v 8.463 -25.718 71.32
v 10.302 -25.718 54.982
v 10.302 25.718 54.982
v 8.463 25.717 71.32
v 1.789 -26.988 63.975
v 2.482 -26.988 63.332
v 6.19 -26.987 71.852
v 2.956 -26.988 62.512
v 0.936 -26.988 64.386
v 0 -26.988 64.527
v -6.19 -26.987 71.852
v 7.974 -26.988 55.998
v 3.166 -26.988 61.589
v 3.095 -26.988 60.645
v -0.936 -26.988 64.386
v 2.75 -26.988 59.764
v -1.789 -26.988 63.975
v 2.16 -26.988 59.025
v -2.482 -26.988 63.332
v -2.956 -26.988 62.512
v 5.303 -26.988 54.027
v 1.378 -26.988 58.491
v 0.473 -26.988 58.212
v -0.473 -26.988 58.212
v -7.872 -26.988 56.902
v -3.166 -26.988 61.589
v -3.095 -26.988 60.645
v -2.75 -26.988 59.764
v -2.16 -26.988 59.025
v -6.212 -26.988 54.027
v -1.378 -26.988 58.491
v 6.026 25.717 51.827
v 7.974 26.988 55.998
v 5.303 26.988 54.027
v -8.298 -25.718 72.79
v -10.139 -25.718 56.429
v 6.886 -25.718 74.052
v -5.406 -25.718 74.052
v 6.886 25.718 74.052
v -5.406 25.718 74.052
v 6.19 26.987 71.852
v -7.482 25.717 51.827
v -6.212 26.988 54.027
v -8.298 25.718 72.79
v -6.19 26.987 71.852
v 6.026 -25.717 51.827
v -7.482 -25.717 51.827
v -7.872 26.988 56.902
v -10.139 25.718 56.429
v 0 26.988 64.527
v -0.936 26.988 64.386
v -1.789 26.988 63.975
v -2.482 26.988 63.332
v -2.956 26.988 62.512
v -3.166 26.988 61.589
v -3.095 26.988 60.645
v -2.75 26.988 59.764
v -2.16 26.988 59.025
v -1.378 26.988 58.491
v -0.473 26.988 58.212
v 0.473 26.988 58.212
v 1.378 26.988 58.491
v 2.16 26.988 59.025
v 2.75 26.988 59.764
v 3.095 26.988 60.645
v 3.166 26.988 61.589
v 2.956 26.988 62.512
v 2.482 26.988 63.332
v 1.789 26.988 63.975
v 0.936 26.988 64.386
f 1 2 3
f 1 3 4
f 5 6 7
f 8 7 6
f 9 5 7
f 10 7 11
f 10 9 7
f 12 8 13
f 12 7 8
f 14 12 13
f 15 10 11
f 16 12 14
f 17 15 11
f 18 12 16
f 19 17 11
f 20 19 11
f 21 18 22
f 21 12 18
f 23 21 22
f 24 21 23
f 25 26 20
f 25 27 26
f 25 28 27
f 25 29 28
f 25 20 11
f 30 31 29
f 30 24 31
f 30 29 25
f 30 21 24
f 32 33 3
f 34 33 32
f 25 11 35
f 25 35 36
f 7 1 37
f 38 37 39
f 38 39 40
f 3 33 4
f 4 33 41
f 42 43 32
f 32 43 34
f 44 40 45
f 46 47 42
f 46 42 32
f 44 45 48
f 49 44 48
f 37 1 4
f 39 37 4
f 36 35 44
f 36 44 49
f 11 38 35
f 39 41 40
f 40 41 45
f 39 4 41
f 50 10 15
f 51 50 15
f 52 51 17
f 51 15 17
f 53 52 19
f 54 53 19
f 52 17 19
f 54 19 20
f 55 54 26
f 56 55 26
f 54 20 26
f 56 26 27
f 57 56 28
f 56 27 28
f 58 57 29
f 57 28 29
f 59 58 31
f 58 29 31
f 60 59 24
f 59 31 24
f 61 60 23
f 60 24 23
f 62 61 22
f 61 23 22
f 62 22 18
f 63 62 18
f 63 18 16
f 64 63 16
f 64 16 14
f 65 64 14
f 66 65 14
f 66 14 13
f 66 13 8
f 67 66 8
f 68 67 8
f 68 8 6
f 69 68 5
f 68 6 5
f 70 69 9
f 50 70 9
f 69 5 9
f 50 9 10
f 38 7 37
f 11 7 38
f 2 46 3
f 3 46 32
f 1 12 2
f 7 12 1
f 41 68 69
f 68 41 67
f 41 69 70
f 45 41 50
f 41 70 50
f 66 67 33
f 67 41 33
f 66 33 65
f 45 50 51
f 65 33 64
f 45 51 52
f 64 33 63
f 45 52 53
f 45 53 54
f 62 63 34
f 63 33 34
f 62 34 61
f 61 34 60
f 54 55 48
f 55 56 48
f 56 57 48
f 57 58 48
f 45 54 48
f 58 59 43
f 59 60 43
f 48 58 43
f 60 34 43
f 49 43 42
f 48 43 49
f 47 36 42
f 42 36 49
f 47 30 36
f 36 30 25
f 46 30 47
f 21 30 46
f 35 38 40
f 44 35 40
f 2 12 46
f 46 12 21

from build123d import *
from OCP.BRepFilletAPI import BRepFilletAPI_MakeChamfer

# Parameters (mm, degrees)
SKETCH1_R           = 3.175
BOSS_EXTRUDE1_DEPTH = 53.975
CHAMFER1_SIZE       = 3.175
CHAMFER1_SIZE2      = 4.631063529
CHAMFER2_SIZE       = 1.27
CHAMFER2_SIZE2      = 2.749716278
CHAMFER2_SIZE2_2    = 2.199704526


# Read off the part's stored shape, not the designer's step: Imported1
with BuildPart() as part:
    # Sketch1 → Boss-Extrude1 (new body)
    with BuildSketch(Plane(origin=(0, -26.9875, 0), x_dir=(-1, 0, 0), z_dir=(0, -1, 0))):
        Polygon((-8.155551794, -74.05198332), (8.155551794, -74.05198332), (10.657362253, -51.82698332), (-10.657362253, -51.82698332), align=None)
        with Locations(Location((0, -61.35198332, 0), (0, 0, 270))):
            Circle(SKETCH1_R, mode=Mode.SUBTRACT)
    extrude(amount=-BOSS_EXTRUDE1_DEPTH)

    # Chamfer1: one chamfer whose edges measure the first distance from different faces: ONE call of the kernel's chamfer builder (chamfer() names one face for all edges)
    chamfer1_edges_1 = [part.edges().sort_by_distance(p)[0] for p in [
        (-10.657362253, 0, 51.82698332),
    ]]
    chamfer1_side_1 = [part.faces().sort_by_distance(p)[0] for p in [
        (0, 0, 51.82698332),
    ]]
    chamfer1_edges_2 = [part.edges().sort_by_distance(p)[0] for p in [
        (10.657362253, 0, 51.82698332),
    ]]
    chamfer1_side_2 = [part.faces().sort_by_distance(p)[0] for p in [
        (9.406457023, 0, 62.93948332),
    ]]
    chamfer1 = BRepFilletAPI_MakeChamfer(part.part.solid().wrapped)
    for e in chamfer1_edges_1:
        chamfer1.Add(CHAMFER1_SIZE, CHAMFER1_SIZE2, e.wrapped, chamfer1_side_1[0].wrapped)  # the first distance lies on this face
    for e in chamfer1_edges_2:
        chamfer1.Add(CHAMFER1_SIZE, CHAMFER1_SIZE2, e.wrapped, chamfer1_side_2[0].wrapped)  # the first distance lies on this face
    add(Compound.cast(chamfer1.Shape()), mode=Mode.REPLACE)

    # Chamfer2: one chamfer whose edges measure the first distance from different faces: ONE call of the kernel's chamfer builder (chamfer() names one face for all edges)
    chamfer2_edges_1 = [part.edges().sort_by_distance(p)[0] for p in [
        (8.155551794, 0, 74.05198332),
    ]]
    chamfer2_side_1 = [part.faces().sort_by_distance(p)[0] for p in [
        (0, 0, 74.05198332),
    ]]
    chamfer2_edges_2 = [part.edges().sort_by_distance(p)[0] for p in [
        (-9.147439527, -26.9875, 65.240482514),
        (-9.147439527, 26.9875, 65.240482514),
    ]]
    chamfer2_side_2 = [part.faces().sort_by_distance(p)[0] for p in [
        (-9.147439527, 0, 65.240482514),
    ]]
    chamfer2_edges_3 = [part.edges().sort_by_distance(p)[0] for p in [
        (0, -26.9875, 74.05198332),
        (0, 26.9875, 74.05198332),
    ]]
    chamfer2_side_3 = [part.faces().sort_by_distance(p)[0] for p in [
        (0, 0, 74.05198332),
    ]]
    chamfer2_edges_4 = [part.edges().sort_by_distance(p)[0] for p in [
        (9.228877825, 26.9875, 64.517019969),
        (9.228877825, -26.9875, 64.517019969),
    ]]
    chamfer2_side_4 = [part.faces().sort_by_distance(p)[0] for p in [
        (9.228877825, 0, 64.517019969),
    ]]
    chamfer2_edges_5 = [part.edges().sort_by_distance(p)[0] for p in [
        (-8.155551794, 0, 74.05198332),
    ]]
    chamfer2_side_5 = [part.faces().sort_by_distance(p)[0] for p in [
        (-9.147439527, 0, 65.240482514),
    ]]
    chamfer2_edges_6 = [part.edges().sort_by_distance(p)[0] for p in [
        (-0.728031765, -26.9875, 51.82698332),
        (-0.728031765, 26.9875, 51.82698332),
    ]]
    chamfer2_side_6 = [part.faces().sort_by_distance(p)[0] for p in [
        (-0.728031765, 0, 51.82698332),
    ]]
    chamfer2_edges_7 = [part.edges().sort_by_distance(p)[0] for p in [
        (8.16425129, -26.9875, 53.404519969),
        (8.16425129, 26.9875, 53.404519969),
    ]]
    chamfer2_side_7 = [part.faces().sort_by_distance(p)[0] for p in [
        (8.16425129, 0, 53.404519969),
    ]]
    chamfer2_edges_8 = [part.edges().sort_by_distance(p)[0] for p in [
        (-8.810844757, -26.9875, 54.127982514),
        (-8.810844757, 26.9875, 54.127982514),
    ]]
    chamfer2_side_8 = [part.faces().sort_by_distance(p)[0] for p in [
        (-8.810844757, 0, 54.127982514),
    ]]
    chamfer2 = BRepFilletAPI_MakeChamfer(part.part.solid().wrapped)
    for e in chamfer2_edges_1:
        chamfer2.Add(CHAMFER2_SIZE, CHAMFER2_SIZE2, e.wrapped, chamfer2_side_1[0].wrapped)  # the first distance lies on this face
    for e in chamfer2_edges_2:
        chamfer2.Add(CHAMFER2_SIZE, CHAMFER2_SIZE2_2, e.wrapped, chamfer2_side_2[0].wrapped)  # the first distance lies on this face
    for e in chamfer2_edges_3:
        chamfer2.Add(CHAMFER2_SIZE, CHAMFER2_SIZE2_2, e.wrapped, chamfer2_side_3[0].wrapped)  # the first distance lies on this face
    for e in chamfer2_edges_4:
        chamfer2.Add(CHAMFER2_SIZE, CHAMFER2_SIZE2_2, e.wrapped, chamfer2_side_4[0].wrapped)  # the first distance lies on this face
    for e in chamfer2_edges_5:
        chamfer2.Add(CHAMFER2_SIZE, CHAMFER2_SIZE2, e.wrapped, chamfer2_side_5[0].wrapped)  # the first distance lies on this face
    for e in chamfer2_edges_6:
        chamfer2.Add(CHAMFER2_SIZE, CHAMFER2_SIZE2_2, e.wrapped, chamfer2_side_6[0].wrapped)  # the first distance lies on this face
    for e in chamfer2_edges_7:
        chamfer2.Add(CHAMFER2_SIZE, CHAMFER2_SIZE2_2, e.wrapped, chamfer2_side_7[0].wrapped)  # the first distance lies on this face
    for e in chamfer2_edges_8:
        chamfer2.Add(CHAMFER2_SIZE, CHAMFER2_SIZE2_2, e.wrapped, chamfer2_side_8[0].wrapped)  # the first distance lies on this face
    add(Compound.cast(chamfer2.Shape()), mode=Mode.REPLACE)


solid = part.part
